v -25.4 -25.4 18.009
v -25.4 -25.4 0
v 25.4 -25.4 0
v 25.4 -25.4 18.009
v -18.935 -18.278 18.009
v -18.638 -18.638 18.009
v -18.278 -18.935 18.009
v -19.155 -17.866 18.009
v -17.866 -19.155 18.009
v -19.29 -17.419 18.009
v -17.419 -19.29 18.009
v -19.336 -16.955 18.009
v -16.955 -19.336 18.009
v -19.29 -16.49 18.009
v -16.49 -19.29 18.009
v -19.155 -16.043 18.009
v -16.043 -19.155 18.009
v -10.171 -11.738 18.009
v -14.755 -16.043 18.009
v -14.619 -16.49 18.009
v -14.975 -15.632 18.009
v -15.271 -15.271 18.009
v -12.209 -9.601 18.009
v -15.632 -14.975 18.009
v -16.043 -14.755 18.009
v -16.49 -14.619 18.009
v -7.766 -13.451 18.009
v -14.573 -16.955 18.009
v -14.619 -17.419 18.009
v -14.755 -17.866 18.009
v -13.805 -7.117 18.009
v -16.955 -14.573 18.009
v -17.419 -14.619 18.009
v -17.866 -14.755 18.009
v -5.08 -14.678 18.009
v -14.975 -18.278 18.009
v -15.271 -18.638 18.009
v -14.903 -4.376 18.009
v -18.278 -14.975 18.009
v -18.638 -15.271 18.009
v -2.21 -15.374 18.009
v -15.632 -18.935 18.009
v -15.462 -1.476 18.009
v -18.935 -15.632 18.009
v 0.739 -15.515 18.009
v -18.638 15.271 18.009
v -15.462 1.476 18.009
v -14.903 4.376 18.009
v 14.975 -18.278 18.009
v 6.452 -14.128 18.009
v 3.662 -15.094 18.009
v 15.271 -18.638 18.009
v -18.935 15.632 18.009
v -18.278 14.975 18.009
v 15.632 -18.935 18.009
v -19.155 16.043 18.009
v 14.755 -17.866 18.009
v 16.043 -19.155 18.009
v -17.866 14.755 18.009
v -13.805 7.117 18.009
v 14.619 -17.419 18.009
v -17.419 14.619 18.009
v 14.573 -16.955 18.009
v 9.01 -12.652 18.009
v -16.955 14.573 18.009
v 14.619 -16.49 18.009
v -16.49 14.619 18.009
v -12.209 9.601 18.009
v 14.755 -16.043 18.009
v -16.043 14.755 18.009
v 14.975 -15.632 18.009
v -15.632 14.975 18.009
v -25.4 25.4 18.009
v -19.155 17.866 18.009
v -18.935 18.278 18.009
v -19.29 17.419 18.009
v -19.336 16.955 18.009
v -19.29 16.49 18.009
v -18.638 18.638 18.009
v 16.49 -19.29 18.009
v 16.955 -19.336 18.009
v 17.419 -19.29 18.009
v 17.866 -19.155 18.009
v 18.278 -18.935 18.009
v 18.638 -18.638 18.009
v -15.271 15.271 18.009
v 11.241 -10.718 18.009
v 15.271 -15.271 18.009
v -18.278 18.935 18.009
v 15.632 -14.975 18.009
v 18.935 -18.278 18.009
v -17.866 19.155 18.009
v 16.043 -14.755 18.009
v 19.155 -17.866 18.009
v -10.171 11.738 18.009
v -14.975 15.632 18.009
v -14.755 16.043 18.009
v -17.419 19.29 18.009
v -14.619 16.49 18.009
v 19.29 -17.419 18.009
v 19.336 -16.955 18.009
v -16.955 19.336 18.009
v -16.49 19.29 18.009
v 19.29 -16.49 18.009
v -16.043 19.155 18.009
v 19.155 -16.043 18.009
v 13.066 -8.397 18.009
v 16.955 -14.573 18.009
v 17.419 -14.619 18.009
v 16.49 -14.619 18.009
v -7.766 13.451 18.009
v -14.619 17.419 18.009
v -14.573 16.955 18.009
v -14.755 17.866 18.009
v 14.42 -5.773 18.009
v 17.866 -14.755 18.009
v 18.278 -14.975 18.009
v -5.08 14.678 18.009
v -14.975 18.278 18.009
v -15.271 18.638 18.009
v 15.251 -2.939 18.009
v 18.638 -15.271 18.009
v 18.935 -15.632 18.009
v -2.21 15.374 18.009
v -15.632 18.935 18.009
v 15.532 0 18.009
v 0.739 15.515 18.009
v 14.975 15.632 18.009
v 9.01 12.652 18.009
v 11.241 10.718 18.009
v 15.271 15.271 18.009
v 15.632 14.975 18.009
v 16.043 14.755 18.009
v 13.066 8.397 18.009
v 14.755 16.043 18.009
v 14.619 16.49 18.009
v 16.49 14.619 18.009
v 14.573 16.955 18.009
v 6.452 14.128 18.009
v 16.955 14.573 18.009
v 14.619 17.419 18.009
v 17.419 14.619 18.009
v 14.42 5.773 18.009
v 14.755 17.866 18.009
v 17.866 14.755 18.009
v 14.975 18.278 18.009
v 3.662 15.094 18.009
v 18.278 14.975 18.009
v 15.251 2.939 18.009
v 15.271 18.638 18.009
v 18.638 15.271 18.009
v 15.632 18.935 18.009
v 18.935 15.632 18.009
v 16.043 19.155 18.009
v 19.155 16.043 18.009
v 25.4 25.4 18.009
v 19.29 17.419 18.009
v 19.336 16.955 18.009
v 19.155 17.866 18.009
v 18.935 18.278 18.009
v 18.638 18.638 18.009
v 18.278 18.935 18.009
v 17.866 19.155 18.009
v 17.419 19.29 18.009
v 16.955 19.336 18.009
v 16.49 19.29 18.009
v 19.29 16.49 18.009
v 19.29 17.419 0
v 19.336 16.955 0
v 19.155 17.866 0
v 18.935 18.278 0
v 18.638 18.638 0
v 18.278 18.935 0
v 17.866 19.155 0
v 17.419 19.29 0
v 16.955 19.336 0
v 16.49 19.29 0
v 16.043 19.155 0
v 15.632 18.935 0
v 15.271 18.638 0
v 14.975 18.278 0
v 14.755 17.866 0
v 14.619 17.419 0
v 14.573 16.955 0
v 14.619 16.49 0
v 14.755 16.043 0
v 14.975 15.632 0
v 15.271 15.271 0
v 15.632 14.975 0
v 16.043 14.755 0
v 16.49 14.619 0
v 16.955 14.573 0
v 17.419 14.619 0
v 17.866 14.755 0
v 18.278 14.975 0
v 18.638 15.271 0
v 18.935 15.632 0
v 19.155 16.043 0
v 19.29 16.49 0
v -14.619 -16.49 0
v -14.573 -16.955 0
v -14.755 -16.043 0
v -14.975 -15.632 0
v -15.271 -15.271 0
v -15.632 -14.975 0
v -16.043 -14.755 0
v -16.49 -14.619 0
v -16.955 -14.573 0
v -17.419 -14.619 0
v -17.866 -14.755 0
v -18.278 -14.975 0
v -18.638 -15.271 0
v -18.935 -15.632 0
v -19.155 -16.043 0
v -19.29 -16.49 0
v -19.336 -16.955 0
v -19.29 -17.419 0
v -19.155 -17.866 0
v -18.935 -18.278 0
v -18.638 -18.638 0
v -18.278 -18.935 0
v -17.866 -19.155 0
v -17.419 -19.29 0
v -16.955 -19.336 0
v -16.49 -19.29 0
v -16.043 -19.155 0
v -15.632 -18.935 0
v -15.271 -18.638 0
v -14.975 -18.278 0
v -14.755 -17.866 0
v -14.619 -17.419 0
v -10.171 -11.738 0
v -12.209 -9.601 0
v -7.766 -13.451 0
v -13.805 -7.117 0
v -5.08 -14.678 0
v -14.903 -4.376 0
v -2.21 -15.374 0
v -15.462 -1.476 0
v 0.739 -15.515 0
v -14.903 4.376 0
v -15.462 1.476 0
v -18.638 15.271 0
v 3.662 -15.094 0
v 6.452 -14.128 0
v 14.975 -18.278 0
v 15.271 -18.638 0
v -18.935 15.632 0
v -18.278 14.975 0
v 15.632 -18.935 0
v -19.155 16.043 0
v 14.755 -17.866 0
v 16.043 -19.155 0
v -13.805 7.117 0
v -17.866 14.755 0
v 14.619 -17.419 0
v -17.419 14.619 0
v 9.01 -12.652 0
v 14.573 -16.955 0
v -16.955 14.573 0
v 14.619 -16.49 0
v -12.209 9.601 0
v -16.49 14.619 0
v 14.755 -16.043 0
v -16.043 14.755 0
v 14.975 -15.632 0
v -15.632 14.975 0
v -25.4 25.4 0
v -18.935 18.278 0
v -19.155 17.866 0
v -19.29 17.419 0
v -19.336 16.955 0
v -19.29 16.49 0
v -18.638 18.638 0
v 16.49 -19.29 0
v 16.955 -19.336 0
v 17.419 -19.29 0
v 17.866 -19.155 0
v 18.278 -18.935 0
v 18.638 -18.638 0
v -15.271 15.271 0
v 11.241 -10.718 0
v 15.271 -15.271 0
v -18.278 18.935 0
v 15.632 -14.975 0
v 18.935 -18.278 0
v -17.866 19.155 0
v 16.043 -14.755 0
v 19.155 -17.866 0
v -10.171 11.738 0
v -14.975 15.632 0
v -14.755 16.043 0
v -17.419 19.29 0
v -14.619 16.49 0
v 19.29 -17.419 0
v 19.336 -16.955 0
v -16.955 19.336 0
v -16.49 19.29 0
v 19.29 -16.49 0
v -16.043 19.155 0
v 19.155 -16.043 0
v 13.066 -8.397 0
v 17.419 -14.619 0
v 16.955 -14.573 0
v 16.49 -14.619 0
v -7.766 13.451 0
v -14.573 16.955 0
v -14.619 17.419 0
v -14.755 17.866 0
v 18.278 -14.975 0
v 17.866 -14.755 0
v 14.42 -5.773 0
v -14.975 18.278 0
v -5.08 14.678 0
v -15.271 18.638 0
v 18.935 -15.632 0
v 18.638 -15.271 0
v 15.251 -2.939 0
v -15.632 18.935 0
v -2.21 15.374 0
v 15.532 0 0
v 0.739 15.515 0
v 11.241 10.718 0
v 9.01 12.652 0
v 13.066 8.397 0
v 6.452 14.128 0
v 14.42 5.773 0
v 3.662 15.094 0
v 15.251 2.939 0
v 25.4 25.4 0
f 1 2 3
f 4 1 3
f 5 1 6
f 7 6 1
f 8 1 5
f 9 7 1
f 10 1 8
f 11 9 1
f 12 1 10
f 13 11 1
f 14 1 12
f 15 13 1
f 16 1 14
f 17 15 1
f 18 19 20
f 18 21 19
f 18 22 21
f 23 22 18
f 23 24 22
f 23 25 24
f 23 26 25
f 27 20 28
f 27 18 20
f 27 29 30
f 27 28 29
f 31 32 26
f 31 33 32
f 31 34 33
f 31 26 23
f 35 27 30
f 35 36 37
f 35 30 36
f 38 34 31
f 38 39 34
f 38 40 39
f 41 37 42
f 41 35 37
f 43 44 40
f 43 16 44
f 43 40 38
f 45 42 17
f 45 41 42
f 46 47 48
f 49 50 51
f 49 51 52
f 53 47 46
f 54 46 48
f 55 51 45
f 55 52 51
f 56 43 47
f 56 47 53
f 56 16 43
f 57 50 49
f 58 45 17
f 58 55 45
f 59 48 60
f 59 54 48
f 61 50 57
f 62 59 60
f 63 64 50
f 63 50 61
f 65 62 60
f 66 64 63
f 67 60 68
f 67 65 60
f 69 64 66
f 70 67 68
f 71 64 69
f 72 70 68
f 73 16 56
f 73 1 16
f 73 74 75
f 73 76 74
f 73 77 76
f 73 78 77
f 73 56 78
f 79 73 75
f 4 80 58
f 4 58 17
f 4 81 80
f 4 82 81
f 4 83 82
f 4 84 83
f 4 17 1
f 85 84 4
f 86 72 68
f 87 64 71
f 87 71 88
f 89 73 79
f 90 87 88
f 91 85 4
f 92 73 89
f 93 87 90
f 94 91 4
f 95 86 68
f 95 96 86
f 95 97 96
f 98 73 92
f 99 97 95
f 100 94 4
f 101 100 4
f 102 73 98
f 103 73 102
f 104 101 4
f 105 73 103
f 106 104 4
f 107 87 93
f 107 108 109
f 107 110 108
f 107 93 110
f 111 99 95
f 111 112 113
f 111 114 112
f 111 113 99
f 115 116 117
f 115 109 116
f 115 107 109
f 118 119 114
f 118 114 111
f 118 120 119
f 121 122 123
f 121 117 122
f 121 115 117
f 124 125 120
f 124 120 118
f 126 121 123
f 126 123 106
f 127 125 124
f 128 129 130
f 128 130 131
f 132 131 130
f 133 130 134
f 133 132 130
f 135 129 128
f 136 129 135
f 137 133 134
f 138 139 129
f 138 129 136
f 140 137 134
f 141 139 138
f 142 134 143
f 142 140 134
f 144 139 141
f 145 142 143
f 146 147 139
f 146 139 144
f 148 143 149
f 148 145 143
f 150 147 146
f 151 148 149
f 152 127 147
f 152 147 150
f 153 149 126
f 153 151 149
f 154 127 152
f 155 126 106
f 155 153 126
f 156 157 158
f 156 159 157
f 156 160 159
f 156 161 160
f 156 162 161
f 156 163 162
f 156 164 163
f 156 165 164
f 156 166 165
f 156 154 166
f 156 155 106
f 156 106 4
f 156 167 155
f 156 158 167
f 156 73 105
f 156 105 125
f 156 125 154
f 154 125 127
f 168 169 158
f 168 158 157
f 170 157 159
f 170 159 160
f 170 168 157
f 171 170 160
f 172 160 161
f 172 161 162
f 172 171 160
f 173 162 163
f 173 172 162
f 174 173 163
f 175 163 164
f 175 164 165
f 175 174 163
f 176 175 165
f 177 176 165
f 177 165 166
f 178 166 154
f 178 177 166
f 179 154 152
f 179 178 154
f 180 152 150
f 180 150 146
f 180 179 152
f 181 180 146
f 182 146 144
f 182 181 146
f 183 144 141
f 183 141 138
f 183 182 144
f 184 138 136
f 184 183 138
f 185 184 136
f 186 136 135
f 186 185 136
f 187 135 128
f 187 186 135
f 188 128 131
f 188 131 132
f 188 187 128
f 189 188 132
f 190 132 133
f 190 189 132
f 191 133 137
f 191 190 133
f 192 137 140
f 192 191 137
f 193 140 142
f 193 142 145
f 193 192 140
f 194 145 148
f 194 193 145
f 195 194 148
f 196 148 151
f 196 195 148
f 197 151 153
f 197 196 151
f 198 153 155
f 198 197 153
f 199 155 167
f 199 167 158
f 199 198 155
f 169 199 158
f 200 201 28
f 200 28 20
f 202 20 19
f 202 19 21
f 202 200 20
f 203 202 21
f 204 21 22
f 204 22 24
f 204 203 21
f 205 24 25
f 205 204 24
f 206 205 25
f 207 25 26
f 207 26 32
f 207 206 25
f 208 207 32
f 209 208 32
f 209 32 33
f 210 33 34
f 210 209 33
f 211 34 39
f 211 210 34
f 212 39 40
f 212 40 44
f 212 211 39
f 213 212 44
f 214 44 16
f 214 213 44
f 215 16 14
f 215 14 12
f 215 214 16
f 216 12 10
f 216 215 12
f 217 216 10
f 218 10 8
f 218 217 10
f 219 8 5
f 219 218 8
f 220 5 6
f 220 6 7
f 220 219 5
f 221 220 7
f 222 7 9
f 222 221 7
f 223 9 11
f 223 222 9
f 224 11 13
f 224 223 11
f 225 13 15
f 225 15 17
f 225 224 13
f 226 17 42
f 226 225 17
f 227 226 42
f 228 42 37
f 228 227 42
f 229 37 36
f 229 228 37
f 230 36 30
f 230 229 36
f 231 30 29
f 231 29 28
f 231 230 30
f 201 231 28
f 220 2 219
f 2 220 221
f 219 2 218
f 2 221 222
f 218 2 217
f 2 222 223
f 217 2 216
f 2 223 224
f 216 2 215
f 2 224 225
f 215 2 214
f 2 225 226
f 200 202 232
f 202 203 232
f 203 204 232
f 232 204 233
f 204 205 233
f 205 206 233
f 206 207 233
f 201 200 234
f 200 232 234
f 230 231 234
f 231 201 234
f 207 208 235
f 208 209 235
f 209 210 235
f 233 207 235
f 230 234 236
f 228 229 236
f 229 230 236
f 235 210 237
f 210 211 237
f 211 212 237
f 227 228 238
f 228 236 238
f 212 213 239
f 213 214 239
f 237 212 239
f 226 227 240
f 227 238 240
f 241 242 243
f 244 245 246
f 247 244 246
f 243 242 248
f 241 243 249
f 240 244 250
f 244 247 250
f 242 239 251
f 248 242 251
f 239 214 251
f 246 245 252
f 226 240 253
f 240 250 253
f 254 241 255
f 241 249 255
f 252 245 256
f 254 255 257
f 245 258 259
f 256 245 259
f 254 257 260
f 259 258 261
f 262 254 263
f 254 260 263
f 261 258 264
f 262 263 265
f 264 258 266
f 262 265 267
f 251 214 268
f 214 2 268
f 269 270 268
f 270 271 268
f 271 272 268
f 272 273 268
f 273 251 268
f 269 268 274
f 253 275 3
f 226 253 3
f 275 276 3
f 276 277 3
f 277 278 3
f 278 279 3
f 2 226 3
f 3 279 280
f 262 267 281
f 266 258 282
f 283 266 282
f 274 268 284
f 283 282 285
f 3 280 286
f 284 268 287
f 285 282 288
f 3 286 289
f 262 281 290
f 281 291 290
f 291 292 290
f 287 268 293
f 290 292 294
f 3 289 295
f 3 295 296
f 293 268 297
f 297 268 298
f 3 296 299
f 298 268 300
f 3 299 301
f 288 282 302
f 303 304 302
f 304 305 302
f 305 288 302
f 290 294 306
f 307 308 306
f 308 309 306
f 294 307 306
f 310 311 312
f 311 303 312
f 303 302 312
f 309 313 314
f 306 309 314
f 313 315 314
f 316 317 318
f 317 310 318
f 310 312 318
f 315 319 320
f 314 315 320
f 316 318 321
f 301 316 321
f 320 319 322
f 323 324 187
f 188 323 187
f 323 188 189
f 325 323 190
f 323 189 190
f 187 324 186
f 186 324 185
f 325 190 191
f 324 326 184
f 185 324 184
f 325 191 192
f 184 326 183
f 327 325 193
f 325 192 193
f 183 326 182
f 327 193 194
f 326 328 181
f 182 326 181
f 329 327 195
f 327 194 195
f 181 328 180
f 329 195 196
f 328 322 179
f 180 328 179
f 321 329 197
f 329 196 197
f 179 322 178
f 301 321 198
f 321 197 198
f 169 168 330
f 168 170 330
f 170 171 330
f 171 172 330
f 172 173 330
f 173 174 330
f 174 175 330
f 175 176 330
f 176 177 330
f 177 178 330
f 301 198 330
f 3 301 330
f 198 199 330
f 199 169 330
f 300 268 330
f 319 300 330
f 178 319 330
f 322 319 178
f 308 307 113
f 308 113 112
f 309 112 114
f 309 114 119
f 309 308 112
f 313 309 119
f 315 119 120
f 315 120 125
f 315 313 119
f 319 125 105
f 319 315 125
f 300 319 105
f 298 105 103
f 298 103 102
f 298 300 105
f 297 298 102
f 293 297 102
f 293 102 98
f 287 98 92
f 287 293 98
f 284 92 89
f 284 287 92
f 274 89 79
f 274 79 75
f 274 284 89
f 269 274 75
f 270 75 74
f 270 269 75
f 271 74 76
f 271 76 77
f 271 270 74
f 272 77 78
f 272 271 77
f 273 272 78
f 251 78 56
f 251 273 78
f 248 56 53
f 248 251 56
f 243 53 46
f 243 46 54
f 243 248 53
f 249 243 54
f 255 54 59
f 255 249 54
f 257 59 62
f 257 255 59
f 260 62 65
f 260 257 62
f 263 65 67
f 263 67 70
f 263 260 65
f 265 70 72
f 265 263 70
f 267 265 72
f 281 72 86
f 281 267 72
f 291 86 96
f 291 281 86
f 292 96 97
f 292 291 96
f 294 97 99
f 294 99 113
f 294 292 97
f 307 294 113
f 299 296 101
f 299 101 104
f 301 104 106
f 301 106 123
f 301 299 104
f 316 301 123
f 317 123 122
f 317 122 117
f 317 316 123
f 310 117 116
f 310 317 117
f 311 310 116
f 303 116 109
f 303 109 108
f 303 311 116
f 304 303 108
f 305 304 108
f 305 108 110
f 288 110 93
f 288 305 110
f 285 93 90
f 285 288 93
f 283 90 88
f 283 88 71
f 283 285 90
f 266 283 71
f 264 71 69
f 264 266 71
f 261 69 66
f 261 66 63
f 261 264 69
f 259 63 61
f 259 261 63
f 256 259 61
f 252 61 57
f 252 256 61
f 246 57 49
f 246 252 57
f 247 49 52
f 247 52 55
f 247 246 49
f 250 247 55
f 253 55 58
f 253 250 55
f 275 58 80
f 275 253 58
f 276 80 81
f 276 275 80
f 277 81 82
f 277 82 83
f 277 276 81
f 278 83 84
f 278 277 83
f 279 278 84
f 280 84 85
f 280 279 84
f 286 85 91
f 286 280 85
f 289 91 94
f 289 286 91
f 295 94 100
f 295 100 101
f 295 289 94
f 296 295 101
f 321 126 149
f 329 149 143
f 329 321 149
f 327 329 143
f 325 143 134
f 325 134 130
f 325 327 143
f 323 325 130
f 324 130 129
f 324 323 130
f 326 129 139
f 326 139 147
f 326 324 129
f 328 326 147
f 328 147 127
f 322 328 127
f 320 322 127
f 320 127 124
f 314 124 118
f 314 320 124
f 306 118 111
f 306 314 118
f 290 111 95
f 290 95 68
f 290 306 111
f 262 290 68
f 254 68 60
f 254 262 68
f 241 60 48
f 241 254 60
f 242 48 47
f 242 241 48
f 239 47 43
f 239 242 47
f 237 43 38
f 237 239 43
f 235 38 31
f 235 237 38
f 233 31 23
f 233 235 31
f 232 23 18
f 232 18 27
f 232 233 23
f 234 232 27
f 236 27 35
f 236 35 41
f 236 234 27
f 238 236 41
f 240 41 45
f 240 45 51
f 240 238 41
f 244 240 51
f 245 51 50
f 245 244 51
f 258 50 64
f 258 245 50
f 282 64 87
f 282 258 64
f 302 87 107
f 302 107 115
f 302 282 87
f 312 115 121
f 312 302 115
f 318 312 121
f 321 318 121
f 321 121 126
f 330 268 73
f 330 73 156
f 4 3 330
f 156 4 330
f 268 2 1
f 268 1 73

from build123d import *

# Parameters (mm, degrees)
F0_W     = 50.8
F0_H     = 50.8
F0_R     = 2.38125
F0_R_2   = 15.5321
F1_DEPTH = 18.0086


with BuildPart() as f1:
    # F0 (on Top) → F1 (new body)
    with BuildSketch(Plane.XY):
        Rectangle(F0_W, F0_H)
        with Locations((-16.954631, -16.954631)):
            Circle(F0_R, mode=Mode.SUBTRACT)
        Circle(F0_R_2, mode=Mode.SUBTRACT)
        with Locations((16.954631, -16.954631)):
            Circle(F0_R, mode=Mode.SUBTRACT)
        with Locations((-16.954631, 16.954631)):
            Circle(F0_R, mode=Mode.SUBTRACT)
        with Locations((16.954631, 16.954631)):
            Circle(F0_R, mode=Mode.SUBTRACT)
    extrude(amount=F1_DEPTH)


solid = f1.part
